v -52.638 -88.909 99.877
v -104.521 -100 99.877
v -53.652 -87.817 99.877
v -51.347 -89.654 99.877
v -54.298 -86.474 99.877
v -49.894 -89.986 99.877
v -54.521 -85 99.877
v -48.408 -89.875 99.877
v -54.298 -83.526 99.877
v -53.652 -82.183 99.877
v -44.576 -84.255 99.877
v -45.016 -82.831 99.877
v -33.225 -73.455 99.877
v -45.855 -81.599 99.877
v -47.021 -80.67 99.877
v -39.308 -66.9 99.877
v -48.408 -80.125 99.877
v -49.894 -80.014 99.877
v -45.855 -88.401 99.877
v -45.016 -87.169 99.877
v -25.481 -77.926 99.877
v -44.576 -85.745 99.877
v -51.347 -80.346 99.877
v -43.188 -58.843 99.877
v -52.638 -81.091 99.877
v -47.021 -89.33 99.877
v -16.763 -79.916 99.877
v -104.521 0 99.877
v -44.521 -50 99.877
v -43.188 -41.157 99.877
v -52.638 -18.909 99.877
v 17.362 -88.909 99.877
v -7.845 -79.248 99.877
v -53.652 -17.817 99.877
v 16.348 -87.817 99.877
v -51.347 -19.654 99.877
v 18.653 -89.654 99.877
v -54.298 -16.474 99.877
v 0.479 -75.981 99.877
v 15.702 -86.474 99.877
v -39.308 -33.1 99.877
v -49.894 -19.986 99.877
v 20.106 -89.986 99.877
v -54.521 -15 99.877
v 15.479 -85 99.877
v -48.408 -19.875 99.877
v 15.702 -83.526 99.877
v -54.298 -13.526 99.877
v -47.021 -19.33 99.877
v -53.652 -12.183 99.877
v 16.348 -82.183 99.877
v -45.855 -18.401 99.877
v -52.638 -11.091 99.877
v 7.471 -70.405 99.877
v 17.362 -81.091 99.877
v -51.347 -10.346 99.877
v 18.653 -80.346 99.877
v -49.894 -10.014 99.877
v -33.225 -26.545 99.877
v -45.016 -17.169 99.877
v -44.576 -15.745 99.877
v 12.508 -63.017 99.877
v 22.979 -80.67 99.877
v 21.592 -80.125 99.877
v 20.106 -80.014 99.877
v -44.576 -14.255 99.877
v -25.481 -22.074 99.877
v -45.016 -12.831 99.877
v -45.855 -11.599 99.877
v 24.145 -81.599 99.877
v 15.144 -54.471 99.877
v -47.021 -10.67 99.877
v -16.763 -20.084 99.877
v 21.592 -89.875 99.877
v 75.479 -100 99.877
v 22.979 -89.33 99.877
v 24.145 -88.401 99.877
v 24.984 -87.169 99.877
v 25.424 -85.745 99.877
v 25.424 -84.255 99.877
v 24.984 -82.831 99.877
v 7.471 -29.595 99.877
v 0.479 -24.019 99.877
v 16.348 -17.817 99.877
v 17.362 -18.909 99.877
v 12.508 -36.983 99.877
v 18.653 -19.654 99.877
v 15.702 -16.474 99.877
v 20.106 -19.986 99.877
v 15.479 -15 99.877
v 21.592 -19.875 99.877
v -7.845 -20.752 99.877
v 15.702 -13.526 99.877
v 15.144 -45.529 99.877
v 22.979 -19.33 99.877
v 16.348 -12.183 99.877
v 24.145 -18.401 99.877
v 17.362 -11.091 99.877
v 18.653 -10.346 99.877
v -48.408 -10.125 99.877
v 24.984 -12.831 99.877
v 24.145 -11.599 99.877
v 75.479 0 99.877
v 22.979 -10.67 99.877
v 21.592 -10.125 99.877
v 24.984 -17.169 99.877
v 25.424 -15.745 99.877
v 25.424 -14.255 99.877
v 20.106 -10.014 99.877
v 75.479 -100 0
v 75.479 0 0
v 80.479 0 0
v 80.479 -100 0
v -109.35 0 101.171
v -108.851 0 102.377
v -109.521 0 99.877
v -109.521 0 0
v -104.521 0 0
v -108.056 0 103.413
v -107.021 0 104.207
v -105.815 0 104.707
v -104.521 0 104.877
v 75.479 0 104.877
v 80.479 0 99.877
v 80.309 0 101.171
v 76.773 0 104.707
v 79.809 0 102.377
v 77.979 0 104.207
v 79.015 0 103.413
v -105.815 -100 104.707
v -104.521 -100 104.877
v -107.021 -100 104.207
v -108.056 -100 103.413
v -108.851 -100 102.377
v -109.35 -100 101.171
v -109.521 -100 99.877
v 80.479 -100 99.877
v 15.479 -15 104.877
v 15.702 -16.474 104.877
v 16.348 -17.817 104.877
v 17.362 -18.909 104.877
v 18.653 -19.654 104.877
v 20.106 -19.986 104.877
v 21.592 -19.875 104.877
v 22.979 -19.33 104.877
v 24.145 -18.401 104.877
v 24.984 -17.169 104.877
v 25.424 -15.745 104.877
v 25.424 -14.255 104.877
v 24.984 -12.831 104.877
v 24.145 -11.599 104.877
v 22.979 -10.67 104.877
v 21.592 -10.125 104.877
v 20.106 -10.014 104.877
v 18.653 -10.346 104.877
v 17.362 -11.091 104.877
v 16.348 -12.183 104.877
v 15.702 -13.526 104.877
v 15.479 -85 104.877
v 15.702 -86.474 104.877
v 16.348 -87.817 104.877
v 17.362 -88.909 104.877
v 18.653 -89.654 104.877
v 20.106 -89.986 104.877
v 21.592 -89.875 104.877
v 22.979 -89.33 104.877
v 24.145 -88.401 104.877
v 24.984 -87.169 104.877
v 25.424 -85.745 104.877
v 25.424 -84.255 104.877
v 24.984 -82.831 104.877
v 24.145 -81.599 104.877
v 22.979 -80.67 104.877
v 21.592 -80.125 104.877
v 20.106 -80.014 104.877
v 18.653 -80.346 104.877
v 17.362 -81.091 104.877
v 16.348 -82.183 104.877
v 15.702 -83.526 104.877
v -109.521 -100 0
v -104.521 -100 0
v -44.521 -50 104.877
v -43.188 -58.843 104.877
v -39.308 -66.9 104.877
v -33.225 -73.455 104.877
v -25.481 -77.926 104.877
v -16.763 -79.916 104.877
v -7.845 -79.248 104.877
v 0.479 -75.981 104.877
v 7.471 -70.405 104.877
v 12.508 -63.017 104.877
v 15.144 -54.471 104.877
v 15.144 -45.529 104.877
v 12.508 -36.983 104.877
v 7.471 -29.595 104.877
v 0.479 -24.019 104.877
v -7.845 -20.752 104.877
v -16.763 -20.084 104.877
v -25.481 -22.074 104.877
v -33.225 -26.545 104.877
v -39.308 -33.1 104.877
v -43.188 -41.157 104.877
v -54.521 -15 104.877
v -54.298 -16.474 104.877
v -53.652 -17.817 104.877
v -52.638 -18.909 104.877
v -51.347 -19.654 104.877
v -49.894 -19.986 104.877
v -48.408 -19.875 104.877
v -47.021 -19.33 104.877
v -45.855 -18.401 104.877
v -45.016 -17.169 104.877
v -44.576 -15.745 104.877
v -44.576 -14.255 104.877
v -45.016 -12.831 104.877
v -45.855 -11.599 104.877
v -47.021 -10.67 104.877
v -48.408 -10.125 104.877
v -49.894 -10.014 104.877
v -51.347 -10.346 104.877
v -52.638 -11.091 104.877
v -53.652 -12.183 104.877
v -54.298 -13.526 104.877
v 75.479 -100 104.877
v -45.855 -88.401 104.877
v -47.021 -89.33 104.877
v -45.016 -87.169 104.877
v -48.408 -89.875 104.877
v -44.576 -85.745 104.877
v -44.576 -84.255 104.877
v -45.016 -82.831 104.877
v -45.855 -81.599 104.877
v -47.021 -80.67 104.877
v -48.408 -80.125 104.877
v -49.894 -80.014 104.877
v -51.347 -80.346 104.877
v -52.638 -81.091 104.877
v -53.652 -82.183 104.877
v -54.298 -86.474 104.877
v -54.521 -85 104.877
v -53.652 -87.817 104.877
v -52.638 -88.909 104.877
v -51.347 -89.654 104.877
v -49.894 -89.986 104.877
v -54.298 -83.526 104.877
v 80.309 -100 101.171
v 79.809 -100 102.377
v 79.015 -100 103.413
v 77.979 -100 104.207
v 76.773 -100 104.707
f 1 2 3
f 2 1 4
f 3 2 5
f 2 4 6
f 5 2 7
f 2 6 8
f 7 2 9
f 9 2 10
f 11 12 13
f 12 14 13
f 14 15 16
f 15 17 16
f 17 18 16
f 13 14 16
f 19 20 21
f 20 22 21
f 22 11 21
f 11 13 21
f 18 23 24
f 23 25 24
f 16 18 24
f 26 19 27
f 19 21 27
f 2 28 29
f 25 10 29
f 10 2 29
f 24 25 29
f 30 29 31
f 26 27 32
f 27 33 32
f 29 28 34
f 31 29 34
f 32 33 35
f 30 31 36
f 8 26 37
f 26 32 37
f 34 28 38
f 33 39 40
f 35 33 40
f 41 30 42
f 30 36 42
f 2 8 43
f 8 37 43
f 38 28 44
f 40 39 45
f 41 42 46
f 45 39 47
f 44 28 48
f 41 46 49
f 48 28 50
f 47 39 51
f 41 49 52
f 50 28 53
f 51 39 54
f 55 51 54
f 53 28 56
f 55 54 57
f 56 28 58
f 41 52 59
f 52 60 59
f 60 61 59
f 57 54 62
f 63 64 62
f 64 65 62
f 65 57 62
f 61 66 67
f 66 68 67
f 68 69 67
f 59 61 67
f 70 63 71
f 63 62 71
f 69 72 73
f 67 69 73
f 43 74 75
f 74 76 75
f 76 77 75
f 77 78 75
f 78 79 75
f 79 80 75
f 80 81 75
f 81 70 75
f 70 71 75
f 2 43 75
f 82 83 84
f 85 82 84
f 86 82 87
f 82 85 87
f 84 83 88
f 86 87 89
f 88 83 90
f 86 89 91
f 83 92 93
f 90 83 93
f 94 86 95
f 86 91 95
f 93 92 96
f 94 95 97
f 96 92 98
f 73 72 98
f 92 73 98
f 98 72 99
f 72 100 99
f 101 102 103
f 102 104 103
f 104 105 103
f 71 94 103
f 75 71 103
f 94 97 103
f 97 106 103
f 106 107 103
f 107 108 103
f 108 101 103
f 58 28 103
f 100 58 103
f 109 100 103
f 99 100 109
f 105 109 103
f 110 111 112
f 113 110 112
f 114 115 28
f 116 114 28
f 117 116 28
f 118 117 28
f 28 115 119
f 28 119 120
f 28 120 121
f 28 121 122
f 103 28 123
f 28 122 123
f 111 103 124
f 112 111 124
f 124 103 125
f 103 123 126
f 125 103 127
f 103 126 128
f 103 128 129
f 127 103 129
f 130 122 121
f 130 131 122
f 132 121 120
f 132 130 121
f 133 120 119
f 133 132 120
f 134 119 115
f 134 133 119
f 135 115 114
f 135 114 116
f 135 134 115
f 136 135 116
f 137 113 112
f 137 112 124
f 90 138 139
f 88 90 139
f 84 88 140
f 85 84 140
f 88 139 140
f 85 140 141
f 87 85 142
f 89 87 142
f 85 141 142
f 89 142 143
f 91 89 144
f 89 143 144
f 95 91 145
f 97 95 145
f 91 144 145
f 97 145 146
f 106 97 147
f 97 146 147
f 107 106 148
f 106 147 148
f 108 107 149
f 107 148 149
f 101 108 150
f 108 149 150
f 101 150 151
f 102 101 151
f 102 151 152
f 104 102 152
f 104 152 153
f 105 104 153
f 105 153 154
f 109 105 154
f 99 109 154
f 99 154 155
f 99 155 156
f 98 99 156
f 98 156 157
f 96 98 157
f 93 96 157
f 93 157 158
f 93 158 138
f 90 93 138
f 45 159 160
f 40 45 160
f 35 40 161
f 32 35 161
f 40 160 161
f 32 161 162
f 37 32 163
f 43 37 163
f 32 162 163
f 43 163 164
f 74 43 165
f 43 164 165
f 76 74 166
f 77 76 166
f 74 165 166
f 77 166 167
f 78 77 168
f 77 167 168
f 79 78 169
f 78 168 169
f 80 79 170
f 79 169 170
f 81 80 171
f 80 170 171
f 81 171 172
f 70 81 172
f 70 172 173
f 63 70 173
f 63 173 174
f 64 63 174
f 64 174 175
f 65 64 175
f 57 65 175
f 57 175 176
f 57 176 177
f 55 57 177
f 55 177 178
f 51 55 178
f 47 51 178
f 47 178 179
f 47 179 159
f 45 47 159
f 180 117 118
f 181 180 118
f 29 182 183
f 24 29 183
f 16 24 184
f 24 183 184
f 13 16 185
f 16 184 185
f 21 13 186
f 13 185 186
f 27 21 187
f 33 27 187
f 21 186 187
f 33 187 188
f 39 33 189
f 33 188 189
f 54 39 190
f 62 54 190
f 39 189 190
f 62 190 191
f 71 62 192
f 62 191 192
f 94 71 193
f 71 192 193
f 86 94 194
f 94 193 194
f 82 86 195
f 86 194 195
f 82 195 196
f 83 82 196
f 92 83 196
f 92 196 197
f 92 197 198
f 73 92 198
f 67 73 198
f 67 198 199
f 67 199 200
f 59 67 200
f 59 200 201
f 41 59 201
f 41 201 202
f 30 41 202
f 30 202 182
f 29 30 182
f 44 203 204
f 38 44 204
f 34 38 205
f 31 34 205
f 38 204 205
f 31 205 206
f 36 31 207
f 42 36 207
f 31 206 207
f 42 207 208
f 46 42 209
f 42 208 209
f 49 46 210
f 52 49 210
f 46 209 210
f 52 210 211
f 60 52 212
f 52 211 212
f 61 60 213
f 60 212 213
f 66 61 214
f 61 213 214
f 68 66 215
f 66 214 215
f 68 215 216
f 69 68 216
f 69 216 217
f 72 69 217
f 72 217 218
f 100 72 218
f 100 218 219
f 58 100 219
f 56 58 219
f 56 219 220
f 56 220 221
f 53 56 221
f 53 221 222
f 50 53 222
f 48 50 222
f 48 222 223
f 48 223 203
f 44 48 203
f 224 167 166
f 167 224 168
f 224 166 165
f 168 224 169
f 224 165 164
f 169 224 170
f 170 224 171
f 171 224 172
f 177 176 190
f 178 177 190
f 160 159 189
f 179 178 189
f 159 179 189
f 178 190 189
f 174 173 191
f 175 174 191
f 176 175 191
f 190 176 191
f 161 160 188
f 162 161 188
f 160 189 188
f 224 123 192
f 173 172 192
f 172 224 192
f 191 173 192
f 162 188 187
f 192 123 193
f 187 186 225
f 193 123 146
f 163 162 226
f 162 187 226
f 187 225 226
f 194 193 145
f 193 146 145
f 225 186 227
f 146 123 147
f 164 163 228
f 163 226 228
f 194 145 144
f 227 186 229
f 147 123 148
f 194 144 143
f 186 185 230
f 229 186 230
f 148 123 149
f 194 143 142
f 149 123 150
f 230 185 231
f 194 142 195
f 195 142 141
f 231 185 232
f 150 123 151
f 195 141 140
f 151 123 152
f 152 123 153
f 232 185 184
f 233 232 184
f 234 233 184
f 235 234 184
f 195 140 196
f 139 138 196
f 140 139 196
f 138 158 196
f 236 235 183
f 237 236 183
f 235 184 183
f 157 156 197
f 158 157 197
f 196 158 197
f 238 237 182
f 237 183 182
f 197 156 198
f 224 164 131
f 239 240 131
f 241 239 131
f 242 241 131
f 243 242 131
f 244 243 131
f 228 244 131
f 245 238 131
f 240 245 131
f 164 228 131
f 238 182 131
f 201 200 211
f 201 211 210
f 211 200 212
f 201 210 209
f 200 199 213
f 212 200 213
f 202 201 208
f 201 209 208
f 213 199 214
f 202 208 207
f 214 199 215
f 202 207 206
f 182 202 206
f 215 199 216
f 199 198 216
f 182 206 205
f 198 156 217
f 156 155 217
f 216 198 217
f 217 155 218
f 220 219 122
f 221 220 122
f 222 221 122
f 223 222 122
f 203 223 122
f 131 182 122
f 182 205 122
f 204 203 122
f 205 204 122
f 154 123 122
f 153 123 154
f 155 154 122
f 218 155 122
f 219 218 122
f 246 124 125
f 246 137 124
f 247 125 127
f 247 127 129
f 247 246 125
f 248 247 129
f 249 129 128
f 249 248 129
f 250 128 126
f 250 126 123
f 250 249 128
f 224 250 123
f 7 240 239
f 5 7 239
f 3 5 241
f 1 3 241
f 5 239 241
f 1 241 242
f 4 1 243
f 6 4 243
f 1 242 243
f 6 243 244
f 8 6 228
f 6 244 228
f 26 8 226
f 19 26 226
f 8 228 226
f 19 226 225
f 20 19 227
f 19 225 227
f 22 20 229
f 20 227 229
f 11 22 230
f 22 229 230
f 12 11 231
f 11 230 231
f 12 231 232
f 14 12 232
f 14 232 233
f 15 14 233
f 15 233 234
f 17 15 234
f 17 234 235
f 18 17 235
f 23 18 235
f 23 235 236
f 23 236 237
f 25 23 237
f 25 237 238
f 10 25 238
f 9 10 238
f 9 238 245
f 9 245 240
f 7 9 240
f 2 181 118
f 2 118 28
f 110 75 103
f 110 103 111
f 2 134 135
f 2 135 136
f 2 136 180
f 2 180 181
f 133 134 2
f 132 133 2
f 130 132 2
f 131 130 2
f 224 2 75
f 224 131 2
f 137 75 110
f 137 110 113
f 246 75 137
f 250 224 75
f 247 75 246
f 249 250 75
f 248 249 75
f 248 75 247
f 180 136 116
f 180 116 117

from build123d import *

# Parameters (mm, degrees)
F1_DEPTH = 100
F2_R     = 5
F4_D     = 60
F6_D     = 10


with BuildPart() as f1:
    # F0 (on Front) → F1 (new body)
    with BuildSketch(Plane.XZ):
        Polygon((-109.5206329271, 0), (-104.5206329271, 0), (-104.5206329271, 99.8773593255), (75.4793670729, 99.8773593255), (75.4793670729, 0), (80.4793670729, 0), (80.4793670729, 104.8773593255), (-109.5206329271, 104.8773593255), align=None)
    extrude(amount=F1_DEPTH)

    # F2
    f2_edges = [f1.edges().sort_by_distance(p)[0] for p in [
        (80.479367, -50, 104.877359),
        (-109.520633, -50, 104.877359),
    ]]
    fillet(f2_edges, radius=F2_R)

    # F4 (through all)
    with Locations(Plane(origin=(0, 0, 0), x_dir=(1, 0, 0), z_dir=(0, 0, -1))):
        with Locations((-14.5206329271, 50)):
            Hole(F4_D / 2)

    # F6 (through all)
    with Locations(Plane(origin=(0, 0, 0), x_dir=(1, 0, 0), z_dir=(0, 0, -1))):
        with Locations((-49.5206329271, 15), (20.4793670729, 15), (20.4793670729, 85), (-49.5206329271, 85)):
            Hole(F6_D / 2)


solid = f1.part
